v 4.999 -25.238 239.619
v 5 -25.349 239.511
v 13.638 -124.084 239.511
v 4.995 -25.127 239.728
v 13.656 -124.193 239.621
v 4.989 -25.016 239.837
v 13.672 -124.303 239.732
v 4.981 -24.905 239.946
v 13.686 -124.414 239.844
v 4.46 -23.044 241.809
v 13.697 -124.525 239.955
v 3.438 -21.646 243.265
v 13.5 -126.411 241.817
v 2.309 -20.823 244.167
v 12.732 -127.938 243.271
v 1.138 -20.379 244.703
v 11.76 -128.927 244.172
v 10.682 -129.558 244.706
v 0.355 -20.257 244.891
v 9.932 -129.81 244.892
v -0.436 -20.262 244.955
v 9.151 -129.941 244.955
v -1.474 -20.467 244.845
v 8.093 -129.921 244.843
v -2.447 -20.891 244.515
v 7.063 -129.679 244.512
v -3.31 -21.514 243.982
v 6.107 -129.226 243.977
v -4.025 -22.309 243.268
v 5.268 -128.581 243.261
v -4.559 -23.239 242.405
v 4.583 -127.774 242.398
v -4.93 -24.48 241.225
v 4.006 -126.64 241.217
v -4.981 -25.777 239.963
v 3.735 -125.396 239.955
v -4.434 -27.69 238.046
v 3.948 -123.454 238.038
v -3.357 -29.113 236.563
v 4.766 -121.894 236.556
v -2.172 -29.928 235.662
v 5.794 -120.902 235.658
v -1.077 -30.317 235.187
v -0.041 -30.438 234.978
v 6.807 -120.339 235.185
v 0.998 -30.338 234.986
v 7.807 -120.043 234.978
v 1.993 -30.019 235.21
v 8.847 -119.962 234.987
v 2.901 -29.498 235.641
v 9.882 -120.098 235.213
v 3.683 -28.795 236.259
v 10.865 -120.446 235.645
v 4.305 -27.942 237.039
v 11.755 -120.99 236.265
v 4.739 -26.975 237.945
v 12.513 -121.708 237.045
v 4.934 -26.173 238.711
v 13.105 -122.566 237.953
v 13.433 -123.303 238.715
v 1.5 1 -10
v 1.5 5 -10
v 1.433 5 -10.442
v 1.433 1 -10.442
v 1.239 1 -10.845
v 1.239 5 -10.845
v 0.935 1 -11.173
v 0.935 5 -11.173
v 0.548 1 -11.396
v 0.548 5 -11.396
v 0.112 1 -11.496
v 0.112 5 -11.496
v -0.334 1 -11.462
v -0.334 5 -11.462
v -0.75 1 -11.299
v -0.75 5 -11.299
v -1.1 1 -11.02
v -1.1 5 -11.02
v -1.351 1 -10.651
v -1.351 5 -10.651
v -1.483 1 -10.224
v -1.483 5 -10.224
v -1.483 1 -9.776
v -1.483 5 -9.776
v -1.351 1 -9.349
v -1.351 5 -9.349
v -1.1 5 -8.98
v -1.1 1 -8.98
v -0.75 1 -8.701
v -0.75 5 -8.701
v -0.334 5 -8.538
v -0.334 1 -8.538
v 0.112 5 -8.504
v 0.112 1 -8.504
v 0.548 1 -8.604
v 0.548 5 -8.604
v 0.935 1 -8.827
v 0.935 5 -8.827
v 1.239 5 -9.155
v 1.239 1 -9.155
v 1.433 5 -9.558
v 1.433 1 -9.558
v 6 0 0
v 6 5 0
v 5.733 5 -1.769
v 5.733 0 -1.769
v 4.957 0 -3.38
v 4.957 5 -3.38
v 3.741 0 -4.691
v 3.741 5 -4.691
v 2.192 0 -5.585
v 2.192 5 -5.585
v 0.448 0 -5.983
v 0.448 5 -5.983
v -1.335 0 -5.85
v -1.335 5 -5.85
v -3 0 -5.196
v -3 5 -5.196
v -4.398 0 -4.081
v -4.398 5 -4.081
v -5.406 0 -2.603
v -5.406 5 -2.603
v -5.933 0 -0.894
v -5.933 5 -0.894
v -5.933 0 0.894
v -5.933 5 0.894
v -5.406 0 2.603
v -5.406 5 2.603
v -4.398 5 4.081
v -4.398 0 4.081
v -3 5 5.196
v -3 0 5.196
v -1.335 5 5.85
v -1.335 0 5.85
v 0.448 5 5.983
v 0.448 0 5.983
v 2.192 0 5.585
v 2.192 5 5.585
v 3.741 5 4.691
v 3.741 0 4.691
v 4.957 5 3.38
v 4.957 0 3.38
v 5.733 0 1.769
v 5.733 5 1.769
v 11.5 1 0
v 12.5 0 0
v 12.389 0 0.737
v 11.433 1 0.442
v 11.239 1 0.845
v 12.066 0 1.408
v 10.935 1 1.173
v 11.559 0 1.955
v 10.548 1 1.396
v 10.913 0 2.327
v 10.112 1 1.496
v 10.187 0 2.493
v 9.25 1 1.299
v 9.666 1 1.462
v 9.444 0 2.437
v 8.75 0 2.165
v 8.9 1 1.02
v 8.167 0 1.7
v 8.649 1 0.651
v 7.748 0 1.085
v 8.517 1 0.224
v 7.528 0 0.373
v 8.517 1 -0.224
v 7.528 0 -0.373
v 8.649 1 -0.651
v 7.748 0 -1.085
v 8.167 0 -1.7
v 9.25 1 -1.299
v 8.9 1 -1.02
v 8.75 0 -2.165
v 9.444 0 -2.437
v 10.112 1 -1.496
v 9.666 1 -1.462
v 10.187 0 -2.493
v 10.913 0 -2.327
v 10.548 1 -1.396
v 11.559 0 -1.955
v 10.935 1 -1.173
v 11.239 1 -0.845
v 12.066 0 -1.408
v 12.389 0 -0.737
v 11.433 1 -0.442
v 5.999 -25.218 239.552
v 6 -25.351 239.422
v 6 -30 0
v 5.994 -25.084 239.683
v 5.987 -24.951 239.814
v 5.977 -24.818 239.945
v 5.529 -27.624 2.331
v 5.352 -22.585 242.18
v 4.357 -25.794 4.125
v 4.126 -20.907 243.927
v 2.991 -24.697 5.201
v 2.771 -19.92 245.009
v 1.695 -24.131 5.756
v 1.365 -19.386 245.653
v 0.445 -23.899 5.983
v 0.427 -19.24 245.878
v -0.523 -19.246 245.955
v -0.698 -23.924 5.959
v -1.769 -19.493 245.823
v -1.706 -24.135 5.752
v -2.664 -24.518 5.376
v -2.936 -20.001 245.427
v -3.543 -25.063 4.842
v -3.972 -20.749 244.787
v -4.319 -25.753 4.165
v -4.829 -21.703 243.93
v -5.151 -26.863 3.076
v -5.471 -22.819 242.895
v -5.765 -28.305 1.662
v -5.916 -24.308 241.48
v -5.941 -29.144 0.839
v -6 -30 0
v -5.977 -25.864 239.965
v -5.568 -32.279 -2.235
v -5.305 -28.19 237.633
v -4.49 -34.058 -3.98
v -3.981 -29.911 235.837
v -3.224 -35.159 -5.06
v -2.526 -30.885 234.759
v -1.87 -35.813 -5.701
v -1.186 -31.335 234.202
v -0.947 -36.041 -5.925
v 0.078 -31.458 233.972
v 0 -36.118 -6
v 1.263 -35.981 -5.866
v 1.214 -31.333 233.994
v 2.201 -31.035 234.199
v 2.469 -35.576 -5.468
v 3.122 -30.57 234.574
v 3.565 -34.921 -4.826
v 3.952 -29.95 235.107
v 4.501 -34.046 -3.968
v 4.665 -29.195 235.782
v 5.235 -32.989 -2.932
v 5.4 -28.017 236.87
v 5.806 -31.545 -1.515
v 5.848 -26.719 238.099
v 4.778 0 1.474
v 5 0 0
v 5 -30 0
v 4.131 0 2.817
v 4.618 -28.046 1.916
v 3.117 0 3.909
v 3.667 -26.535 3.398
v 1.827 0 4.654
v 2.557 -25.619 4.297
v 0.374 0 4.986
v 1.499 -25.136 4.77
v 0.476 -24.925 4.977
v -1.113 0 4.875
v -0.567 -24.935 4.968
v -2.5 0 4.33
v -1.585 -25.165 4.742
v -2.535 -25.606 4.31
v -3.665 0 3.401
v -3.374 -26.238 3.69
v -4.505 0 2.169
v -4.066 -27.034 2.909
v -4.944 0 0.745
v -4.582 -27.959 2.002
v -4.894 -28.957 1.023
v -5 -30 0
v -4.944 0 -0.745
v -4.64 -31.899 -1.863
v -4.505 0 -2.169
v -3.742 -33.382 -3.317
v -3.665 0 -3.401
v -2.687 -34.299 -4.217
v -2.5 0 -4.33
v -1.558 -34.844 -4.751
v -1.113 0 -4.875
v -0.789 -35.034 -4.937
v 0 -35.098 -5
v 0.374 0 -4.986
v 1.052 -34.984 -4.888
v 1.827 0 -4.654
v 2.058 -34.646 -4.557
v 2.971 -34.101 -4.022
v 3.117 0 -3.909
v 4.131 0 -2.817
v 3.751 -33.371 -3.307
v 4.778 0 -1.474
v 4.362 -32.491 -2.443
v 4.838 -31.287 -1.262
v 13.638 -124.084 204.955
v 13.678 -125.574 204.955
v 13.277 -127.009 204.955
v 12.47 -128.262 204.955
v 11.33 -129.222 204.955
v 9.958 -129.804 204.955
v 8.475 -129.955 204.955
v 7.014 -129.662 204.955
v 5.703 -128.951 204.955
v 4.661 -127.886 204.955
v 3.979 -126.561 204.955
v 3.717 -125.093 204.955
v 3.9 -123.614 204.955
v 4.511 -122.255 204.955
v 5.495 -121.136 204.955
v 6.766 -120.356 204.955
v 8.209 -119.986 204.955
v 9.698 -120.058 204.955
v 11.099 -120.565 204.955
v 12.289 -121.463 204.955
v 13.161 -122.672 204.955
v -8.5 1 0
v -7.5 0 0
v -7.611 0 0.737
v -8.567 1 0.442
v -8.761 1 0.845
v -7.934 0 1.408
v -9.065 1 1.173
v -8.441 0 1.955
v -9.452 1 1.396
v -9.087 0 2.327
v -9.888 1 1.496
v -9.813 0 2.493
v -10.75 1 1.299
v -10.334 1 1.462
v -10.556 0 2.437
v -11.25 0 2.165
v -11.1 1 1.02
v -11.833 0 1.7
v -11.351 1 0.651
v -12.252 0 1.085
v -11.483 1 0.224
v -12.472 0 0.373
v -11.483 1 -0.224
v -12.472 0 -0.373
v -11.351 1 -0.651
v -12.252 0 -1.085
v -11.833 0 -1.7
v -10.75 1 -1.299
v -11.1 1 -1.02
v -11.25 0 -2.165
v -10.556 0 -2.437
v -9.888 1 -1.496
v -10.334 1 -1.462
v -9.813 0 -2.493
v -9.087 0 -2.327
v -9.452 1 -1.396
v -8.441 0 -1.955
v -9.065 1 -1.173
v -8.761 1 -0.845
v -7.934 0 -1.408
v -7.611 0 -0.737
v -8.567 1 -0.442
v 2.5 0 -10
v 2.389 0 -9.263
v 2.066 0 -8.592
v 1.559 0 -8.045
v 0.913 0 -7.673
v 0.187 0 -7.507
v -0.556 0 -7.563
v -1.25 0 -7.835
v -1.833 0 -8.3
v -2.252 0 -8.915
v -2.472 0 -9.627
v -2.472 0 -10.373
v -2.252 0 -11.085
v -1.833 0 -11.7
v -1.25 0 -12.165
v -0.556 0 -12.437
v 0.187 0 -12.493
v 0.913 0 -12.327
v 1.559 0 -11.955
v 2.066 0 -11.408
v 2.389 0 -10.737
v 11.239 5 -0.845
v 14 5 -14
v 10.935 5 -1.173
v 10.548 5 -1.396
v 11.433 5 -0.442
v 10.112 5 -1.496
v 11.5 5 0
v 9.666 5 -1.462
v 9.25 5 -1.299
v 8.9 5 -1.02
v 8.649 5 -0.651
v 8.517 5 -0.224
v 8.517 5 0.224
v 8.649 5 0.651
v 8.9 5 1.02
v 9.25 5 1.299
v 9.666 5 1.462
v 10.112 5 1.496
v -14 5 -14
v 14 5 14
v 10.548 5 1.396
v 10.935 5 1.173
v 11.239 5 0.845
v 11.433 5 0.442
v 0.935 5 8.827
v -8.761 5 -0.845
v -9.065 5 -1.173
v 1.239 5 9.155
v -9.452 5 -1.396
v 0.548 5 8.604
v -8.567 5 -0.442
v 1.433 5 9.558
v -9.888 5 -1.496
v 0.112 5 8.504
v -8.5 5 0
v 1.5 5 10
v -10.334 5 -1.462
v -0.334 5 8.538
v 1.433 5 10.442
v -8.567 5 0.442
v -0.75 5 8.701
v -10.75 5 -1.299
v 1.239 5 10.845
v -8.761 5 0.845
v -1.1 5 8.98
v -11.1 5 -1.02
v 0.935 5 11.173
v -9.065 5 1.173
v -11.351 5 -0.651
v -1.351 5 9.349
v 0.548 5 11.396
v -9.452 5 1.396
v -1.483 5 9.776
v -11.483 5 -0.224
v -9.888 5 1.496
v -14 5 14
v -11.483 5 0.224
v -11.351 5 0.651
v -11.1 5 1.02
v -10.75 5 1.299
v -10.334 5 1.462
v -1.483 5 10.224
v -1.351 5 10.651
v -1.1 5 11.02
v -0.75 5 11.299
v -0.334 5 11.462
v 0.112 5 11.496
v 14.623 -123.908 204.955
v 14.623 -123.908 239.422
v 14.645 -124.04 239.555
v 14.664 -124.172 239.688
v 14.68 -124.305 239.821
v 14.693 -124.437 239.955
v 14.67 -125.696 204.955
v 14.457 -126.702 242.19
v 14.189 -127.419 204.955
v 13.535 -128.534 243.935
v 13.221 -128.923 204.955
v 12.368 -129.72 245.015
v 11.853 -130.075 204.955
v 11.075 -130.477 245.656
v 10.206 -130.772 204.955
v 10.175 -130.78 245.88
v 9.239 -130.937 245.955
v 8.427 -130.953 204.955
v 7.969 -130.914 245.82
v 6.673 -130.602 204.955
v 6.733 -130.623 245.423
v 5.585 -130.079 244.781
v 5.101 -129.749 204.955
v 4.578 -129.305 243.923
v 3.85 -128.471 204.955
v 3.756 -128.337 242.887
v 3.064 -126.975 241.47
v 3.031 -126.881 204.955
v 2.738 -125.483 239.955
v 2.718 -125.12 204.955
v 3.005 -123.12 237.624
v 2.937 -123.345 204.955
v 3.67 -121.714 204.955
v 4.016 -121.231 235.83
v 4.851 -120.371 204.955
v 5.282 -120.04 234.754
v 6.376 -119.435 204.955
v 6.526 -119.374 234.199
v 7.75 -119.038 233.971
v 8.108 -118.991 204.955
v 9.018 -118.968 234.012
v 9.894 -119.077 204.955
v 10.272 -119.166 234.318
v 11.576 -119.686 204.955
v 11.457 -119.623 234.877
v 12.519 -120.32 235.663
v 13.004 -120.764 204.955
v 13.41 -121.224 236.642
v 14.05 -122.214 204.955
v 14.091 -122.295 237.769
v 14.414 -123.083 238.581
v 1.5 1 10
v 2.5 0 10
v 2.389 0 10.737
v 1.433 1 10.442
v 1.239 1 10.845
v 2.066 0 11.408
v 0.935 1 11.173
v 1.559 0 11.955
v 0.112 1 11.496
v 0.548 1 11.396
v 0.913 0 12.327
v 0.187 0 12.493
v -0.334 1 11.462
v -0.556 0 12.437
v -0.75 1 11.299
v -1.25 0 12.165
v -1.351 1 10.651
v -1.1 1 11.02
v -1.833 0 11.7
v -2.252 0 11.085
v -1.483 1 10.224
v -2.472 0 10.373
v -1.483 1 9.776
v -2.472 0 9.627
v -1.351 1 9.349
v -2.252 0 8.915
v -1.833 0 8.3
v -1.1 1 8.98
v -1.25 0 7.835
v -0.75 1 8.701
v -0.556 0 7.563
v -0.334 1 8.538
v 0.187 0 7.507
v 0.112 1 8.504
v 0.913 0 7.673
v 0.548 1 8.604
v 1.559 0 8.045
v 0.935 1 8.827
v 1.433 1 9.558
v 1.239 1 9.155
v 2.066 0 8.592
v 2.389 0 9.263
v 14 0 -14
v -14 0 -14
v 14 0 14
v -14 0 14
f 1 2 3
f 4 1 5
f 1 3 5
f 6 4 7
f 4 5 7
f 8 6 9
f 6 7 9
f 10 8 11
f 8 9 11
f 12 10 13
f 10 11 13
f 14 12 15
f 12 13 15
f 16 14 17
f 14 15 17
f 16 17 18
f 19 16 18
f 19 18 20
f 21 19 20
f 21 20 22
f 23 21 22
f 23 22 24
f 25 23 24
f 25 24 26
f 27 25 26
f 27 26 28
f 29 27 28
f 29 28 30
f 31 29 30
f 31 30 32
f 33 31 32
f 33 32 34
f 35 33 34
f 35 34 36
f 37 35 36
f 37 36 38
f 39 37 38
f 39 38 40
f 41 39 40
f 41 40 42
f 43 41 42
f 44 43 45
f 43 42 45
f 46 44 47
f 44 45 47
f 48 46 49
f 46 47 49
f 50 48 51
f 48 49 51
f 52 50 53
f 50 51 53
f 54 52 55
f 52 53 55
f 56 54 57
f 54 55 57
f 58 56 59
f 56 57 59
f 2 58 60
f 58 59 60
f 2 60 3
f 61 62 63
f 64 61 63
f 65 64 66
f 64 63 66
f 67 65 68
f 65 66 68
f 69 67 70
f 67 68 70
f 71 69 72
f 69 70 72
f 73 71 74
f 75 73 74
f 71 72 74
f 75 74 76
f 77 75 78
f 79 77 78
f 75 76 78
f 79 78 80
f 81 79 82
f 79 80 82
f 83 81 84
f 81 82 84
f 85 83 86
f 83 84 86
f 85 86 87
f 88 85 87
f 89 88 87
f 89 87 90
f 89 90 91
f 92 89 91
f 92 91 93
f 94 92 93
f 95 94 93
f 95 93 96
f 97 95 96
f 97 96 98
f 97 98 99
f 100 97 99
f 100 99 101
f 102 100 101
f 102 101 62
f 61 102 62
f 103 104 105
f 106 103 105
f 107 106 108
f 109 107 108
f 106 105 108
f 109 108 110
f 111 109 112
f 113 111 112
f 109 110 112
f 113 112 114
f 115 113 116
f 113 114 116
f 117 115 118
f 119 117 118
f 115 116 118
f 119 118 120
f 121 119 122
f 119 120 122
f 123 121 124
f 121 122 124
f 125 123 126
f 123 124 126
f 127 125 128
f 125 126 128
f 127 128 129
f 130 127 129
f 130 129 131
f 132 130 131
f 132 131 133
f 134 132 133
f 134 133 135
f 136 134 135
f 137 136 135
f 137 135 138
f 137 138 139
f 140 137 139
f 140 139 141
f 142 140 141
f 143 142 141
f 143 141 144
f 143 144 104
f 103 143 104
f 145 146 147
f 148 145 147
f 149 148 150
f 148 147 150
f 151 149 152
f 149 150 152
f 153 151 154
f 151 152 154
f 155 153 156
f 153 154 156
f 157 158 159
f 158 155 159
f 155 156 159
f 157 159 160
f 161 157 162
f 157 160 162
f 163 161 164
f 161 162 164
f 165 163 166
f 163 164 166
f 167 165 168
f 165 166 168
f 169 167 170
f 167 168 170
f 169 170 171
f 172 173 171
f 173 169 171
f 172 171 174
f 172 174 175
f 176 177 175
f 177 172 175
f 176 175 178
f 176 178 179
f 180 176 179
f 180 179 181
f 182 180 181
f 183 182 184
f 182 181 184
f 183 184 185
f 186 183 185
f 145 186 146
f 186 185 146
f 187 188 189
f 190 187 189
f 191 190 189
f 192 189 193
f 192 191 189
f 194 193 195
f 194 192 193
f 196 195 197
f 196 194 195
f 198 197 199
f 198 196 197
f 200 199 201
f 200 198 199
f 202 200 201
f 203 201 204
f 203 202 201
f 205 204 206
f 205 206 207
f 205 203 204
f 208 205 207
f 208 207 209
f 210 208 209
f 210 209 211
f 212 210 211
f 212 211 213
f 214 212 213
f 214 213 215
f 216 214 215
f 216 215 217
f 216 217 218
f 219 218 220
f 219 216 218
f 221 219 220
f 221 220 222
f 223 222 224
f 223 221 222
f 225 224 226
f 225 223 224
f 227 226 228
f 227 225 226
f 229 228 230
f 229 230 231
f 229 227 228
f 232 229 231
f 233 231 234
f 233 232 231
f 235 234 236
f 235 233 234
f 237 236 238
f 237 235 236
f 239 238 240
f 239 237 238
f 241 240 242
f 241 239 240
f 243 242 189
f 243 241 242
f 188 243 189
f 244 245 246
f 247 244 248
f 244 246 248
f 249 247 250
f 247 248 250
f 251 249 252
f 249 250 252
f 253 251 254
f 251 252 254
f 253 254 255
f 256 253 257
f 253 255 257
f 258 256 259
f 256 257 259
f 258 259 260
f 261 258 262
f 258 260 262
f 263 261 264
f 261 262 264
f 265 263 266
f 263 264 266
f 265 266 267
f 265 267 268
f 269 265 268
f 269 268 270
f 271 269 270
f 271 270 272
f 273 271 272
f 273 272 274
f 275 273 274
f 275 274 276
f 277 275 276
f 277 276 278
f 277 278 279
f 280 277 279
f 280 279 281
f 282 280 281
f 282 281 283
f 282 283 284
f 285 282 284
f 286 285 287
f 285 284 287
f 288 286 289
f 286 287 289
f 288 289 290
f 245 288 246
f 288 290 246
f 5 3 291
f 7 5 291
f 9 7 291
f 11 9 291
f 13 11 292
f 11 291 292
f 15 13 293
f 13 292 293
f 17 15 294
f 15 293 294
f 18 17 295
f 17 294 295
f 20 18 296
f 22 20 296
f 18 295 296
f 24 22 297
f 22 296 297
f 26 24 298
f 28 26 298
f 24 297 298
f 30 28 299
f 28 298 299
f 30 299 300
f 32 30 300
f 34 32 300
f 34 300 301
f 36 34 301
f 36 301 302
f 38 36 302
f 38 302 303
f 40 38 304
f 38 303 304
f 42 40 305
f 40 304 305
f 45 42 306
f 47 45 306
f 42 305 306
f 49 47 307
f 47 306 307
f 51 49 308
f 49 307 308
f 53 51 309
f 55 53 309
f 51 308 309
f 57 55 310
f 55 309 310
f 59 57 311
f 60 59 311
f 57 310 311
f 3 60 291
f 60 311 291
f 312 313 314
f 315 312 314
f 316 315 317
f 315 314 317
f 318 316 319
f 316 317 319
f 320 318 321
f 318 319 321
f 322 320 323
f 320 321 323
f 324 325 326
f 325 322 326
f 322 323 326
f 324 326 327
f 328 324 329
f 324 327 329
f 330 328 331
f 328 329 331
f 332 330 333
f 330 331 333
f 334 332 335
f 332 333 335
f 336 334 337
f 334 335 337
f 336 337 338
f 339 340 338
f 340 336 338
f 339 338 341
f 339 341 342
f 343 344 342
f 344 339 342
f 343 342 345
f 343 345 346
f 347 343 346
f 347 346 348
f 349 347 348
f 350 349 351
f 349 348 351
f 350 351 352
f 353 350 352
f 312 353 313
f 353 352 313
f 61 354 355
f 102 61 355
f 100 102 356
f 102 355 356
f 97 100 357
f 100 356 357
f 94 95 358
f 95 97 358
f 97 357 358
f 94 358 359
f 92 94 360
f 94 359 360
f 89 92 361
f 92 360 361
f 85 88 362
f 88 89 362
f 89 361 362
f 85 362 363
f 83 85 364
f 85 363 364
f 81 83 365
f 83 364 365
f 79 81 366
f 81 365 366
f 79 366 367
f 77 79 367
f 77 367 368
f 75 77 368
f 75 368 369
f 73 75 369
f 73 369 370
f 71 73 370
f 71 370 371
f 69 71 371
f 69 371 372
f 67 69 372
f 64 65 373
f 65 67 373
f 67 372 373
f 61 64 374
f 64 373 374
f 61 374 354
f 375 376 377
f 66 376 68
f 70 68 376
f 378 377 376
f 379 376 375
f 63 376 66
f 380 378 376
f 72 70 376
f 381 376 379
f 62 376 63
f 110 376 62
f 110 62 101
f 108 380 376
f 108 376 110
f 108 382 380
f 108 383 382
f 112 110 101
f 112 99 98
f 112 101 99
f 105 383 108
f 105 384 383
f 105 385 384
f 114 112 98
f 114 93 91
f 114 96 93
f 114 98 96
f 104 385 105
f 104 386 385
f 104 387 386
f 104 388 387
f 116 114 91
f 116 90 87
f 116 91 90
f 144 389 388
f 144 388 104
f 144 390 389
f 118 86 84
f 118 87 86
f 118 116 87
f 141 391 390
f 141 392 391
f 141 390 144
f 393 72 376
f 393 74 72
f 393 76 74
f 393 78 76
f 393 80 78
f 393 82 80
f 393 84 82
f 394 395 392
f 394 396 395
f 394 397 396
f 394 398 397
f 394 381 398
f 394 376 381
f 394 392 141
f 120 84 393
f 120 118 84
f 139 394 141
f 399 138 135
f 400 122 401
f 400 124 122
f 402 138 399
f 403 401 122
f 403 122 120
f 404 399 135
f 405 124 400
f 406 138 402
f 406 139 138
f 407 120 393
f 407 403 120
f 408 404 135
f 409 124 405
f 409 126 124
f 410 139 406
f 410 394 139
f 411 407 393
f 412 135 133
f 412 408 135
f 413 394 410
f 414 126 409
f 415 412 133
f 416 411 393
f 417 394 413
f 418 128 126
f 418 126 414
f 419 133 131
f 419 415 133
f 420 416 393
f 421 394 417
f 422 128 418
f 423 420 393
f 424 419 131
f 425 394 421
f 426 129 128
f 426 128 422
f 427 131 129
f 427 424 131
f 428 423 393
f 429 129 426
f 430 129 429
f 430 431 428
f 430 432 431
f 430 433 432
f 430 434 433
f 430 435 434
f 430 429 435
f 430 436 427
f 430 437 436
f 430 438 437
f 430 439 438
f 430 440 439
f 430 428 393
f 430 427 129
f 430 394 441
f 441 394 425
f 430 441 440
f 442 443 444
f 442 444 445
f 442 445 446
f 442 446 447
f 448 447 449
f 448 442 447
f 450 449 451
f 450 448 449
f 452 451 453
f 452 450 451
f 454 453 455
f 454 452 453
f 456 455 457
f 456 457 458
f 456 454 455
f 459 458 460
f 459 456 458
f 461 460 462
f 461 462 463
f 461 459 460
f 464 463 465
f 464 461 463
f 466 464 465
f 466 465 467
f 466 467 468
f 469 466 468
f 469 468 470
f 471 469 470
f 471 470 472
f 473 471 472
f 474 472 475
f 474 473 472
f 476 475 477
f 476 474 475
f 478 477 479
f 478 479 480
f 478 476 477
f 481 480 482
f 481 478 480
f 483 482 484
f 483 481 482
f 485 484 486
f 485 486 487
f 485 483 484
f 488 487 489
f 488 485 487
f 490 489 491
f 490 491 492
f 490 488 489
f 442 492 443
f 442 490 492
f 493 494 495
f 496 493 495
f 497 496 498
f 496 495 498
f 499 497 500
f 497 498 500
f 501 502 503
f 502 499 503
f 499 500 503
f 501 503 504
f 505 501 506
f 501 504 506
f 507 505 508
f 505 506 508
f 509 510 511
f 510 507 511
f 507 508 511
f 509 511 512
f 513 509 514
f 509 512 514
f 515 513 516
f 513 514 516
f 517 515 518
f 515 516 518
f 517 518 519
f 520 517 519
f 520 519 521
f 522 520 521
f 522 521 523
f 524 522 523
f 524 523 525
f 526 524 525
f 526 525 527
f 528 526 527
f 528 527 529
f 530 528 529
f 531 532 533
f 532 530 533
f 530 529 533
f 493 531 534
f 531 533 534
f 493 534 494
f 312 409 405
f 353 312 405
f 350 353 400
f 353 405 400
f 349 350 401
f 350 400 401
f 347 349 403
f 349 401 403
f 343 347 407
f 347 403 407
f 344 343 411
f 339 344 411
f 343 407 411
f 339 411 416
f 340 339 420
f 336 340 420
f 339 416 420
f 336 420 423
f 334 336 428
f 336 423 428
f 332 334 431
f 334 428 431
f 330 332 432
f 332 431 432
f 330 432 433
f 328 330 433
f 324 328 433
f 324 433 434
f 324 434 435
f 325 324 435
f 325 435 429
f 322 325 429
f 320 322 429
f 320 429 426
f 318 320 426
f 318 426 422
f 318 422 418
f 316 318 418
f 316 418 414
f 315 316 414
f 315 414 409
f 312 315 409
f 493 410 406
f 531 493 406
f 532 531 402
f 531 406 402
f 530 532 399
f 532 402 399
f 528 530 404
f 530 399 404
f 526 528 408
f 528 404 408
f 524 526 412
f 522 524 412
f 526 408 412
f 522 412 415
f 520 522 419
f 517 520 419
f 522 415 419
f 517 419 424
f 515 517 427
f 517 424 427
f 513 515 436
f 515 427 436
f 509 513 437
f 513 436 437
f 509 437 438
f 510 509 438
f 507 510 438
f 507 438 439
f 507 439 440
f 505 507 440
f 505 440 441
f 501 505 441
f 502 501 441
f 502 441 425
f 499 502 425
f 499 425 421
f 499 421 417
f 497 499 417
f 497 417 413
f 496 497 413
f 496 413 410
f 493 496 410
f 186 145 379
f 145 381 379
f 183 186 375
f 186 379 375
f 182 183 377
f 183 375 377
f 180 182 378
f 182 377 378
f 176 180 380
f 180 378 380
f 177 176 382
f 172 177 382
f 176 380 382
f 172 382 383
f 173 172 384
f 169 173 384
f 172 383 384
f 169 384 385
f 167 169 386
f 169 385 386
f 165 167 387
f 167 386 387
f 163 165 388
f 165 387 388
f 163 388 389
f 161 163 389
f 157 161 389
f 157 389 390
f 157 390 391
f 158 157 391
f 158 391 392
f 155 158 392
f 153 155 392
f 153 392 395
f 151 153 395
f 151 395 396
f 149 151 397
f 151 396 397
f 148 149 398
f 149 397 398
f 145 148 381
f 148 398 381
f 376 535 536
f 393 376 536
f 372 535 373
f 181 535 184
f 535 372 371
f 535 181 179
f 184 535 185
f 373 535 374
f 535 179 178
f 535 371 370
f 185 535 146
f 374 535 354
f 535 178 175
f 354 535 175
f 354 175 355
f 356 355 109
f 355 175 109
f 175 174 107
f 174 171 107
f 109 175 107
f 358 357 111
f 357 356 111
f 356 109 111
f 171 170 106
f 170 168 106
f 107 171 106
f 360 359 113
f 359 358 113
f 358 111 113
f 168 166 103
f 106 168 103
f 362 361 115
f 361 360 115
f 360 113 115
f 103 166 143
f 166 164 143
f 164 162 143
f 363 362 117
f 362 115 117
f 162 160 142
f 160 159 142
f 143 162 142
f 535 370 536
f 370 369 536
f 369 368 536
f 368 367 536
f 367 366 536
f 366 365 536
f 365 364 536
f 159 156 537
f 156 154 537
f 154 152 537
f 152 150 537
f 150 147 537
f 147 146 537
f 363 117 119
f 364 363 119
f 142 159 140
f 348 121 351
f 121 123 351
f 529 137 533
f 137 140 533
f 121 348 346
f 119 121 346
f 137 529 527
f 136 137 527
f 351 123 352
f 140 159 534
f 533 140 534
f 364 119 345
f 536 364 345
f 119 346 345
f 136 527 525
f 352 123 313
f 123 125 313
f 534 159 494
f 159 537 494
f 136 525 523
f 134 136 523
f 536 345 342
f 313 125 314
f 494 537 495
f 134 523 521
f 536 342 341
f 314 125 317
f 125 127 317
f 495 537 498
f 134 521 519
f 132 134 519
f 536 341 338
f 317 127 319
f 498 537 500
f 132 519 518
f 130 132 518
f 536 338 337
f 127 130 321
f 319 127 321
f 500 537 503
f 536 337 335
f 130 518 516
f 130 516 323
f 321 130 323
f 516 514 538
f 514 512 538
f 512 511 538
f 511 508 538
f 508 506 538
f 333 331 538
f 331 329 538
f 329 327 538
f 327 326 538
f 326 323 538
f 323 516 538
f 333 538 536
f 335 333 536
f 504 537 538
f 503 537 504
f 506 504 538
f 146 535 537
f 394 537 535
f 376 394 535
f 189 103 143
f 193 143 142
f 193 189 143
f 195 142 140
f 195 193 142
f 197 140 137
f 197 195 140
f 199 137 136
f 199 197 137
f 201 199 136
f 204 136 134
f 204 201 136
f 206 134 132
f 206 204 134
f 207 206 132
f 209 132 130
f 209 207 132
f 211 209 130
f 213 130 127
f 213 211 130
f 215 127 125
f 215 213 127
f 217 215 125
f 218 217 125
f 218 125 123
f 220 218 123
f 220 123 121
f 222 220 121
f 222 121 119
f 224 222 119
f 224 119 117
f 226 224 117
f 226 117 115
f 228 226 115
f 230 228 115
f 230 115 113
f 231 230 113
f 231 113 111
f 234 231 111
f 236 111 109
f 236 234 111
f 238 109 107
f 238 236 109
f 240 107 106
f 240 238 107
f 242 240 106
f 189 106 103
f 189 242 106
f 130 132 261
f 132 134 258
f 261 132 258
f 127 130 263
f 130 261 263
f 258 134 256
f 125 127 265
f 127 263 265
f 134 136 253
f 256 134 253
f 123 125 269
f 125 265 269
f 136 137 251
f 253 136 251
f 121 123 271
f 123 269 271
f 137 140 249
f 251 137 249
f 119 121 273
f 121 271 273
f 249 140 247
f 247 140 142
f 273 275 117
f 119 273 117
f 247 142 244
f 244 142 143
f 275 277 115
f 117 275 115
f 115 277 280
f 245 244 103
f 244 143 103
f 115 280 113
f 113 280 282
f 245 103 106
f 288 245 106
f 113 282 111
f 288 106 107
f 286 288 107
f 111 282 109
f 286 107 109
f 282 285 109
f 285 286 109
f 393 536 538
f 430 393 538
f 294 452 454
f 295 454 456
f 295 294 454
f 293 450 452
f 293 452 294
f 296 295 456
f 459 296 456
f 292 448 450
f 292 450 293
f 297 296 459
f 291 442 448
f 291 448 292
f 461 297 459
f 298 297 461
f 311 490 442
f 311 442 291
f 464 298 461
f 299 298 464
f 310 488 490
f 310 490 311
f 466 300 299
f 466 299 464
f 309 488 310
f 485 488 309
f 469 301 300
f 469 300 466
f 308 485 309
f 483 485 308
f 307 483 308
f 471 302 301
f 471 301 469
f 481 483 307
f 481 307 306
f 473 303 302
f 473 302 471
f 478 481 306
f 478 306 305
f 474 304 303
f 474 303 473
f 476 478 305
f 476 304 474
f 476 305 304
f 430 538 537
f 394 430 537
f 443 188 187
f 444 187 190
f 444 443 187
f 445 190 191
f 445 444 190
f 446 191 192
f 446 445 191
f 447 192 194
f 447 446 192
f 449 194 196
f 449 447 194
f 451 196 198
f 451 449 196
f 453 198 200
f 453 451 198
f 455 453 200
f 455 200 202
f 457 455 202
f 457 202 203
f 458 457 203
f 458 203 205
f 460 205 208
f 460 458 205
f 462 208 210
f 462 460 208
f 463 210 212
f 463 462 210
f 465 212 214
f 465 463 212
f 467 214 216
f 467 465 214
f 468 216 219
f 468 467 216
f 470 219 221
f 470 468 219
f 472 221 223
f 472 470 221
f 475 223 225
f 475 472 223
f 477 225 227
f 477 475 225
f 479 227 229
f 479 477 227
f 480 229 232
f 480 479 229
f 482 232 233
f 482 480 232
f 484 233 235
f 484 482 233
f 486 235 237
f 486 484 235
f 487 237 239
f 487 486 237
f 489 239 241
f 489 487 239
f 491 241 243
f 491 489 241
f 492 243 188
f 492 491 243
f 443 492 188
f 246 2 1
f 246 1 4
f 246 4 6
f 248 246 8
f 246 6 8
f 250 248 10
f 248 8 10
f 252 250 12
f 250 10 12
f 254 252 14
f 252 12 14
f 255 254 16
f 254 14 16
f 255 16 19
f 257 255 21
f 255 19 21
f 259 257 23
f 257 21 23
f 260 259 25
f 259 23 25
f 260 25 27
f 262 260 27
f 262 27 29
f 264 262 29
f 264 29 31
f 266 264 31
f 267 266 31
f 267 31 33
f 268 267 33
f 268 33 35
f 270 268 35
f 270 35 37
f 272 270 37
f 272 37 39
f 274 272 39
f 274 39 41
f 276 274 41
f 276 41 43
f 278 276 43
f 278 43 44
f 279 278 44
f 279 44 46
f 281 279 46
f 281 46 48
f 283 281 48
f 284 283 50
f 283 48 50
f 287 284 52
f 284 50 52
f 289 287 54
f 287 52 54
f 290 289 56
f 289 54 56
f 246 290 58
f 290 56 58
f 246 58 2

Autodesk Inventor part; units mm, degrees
ref_plane "YZ Plane" through (0, 0, 0) normal (1, 0, 0) x (0, 1, 0)
ref_plane "XZ Plane" through (0, 0, 0) normal (0, 1, 0) x (-1, 0, 0)
ref_plane "XY Plane" through (0, 0, 0) normal (0, 0, 1) x (1, 0, 0)
sketch "Sketch1" plane through (0, 0, 0) normal (0, 1, 0) x (-1, 0, 0)
  line L0 (14, 14) -> (-14, 14)
  line L1 (-14, 14) -> (-14, -14)
  line L2 (-14, -14) -> (14, -14)
  line L3 (14, -14) -> (14, 14)
  point P0 (0, 0)
  point P1 (0, -14)
  dimension "d0" = 28
  dimension "d1" = 28
  dimension "d2" = 14
  dimension "d3" = 14
extrude "Extrusion1" add sketch "Sketch1" along normal blind 5
sketch "Sketch2" plane through (0, 5, 0) normal (0, 1, 0) x (1, 0, 0)
  circle A0 centre (0, 0) radius 6
  circle A1 centre (-10, 0) radius 1.5
  circle A2 centre (0, -10) radius 1.5
  circle A3 centre (10, 0) radius 1.5
  circle A4 centre (0, 10) radius 1.5
  dimension "d6" = 12
  dimension "d7" = 3
  dimension "d8" = 10
  dimension "d11" = 360
extrude "Extrusion2" cut sketch "Sketch2" against normal blind 5
ref_plane "Work Plane1" through (14, 0, 0) normal (0, 0, -1) x (-1, 0, 0)
sketch "Sketch3" plane through (14, 0, 0) normal (0, 0, -1) x (-1, 0, 0)
  point P0 (14, 0)
sketch "Sketch4" plane through (0, 0, 0) normal (0, -1, 0) x (1, 0, 0)
  circle A0 centre (0, 0) radius 6
  circle A1 centre (0, 0) radius 5
  dimension "d19" = 10
  dimension "d22" = 12
sketch3d "3D Sketch1"
  line L0 (0, 0, 0) -> (0, -30, 0)
  line L1 (0, -30, 0) -> (0, -25.3408, 239.9548)
  line L2 (0, -25.3408, 239.9548) -> (8.7156, -124.9603, 239.9548)
  line L3 (8.7156, -124.9603, 239.9548) -> (8.7156, -124.9603, 204.9548)
  dimension "d16" = 30
  dimension "d53" = 100
  dimension "d54" = 85
  dimension "d55" = 35
  dimension "d56" = 240
  dimension "d57" = 90
  dimension "d58" = 90
sweep "Sweep1" add profiles "Sketch4" path "3D Sketch1"
chamfer "Chamfer1" distance 1 angle 45 4 edges at (8.5, 0, 0) (-1.5, 0, 10) (-1.5, 0, -10) (-11.5, 0, 0)
ref_plane "Work Plane2" through (-14, 0, 29) normal (0, 0, 1) x (1, 0, 0)
properties part number "water tube to pump"
